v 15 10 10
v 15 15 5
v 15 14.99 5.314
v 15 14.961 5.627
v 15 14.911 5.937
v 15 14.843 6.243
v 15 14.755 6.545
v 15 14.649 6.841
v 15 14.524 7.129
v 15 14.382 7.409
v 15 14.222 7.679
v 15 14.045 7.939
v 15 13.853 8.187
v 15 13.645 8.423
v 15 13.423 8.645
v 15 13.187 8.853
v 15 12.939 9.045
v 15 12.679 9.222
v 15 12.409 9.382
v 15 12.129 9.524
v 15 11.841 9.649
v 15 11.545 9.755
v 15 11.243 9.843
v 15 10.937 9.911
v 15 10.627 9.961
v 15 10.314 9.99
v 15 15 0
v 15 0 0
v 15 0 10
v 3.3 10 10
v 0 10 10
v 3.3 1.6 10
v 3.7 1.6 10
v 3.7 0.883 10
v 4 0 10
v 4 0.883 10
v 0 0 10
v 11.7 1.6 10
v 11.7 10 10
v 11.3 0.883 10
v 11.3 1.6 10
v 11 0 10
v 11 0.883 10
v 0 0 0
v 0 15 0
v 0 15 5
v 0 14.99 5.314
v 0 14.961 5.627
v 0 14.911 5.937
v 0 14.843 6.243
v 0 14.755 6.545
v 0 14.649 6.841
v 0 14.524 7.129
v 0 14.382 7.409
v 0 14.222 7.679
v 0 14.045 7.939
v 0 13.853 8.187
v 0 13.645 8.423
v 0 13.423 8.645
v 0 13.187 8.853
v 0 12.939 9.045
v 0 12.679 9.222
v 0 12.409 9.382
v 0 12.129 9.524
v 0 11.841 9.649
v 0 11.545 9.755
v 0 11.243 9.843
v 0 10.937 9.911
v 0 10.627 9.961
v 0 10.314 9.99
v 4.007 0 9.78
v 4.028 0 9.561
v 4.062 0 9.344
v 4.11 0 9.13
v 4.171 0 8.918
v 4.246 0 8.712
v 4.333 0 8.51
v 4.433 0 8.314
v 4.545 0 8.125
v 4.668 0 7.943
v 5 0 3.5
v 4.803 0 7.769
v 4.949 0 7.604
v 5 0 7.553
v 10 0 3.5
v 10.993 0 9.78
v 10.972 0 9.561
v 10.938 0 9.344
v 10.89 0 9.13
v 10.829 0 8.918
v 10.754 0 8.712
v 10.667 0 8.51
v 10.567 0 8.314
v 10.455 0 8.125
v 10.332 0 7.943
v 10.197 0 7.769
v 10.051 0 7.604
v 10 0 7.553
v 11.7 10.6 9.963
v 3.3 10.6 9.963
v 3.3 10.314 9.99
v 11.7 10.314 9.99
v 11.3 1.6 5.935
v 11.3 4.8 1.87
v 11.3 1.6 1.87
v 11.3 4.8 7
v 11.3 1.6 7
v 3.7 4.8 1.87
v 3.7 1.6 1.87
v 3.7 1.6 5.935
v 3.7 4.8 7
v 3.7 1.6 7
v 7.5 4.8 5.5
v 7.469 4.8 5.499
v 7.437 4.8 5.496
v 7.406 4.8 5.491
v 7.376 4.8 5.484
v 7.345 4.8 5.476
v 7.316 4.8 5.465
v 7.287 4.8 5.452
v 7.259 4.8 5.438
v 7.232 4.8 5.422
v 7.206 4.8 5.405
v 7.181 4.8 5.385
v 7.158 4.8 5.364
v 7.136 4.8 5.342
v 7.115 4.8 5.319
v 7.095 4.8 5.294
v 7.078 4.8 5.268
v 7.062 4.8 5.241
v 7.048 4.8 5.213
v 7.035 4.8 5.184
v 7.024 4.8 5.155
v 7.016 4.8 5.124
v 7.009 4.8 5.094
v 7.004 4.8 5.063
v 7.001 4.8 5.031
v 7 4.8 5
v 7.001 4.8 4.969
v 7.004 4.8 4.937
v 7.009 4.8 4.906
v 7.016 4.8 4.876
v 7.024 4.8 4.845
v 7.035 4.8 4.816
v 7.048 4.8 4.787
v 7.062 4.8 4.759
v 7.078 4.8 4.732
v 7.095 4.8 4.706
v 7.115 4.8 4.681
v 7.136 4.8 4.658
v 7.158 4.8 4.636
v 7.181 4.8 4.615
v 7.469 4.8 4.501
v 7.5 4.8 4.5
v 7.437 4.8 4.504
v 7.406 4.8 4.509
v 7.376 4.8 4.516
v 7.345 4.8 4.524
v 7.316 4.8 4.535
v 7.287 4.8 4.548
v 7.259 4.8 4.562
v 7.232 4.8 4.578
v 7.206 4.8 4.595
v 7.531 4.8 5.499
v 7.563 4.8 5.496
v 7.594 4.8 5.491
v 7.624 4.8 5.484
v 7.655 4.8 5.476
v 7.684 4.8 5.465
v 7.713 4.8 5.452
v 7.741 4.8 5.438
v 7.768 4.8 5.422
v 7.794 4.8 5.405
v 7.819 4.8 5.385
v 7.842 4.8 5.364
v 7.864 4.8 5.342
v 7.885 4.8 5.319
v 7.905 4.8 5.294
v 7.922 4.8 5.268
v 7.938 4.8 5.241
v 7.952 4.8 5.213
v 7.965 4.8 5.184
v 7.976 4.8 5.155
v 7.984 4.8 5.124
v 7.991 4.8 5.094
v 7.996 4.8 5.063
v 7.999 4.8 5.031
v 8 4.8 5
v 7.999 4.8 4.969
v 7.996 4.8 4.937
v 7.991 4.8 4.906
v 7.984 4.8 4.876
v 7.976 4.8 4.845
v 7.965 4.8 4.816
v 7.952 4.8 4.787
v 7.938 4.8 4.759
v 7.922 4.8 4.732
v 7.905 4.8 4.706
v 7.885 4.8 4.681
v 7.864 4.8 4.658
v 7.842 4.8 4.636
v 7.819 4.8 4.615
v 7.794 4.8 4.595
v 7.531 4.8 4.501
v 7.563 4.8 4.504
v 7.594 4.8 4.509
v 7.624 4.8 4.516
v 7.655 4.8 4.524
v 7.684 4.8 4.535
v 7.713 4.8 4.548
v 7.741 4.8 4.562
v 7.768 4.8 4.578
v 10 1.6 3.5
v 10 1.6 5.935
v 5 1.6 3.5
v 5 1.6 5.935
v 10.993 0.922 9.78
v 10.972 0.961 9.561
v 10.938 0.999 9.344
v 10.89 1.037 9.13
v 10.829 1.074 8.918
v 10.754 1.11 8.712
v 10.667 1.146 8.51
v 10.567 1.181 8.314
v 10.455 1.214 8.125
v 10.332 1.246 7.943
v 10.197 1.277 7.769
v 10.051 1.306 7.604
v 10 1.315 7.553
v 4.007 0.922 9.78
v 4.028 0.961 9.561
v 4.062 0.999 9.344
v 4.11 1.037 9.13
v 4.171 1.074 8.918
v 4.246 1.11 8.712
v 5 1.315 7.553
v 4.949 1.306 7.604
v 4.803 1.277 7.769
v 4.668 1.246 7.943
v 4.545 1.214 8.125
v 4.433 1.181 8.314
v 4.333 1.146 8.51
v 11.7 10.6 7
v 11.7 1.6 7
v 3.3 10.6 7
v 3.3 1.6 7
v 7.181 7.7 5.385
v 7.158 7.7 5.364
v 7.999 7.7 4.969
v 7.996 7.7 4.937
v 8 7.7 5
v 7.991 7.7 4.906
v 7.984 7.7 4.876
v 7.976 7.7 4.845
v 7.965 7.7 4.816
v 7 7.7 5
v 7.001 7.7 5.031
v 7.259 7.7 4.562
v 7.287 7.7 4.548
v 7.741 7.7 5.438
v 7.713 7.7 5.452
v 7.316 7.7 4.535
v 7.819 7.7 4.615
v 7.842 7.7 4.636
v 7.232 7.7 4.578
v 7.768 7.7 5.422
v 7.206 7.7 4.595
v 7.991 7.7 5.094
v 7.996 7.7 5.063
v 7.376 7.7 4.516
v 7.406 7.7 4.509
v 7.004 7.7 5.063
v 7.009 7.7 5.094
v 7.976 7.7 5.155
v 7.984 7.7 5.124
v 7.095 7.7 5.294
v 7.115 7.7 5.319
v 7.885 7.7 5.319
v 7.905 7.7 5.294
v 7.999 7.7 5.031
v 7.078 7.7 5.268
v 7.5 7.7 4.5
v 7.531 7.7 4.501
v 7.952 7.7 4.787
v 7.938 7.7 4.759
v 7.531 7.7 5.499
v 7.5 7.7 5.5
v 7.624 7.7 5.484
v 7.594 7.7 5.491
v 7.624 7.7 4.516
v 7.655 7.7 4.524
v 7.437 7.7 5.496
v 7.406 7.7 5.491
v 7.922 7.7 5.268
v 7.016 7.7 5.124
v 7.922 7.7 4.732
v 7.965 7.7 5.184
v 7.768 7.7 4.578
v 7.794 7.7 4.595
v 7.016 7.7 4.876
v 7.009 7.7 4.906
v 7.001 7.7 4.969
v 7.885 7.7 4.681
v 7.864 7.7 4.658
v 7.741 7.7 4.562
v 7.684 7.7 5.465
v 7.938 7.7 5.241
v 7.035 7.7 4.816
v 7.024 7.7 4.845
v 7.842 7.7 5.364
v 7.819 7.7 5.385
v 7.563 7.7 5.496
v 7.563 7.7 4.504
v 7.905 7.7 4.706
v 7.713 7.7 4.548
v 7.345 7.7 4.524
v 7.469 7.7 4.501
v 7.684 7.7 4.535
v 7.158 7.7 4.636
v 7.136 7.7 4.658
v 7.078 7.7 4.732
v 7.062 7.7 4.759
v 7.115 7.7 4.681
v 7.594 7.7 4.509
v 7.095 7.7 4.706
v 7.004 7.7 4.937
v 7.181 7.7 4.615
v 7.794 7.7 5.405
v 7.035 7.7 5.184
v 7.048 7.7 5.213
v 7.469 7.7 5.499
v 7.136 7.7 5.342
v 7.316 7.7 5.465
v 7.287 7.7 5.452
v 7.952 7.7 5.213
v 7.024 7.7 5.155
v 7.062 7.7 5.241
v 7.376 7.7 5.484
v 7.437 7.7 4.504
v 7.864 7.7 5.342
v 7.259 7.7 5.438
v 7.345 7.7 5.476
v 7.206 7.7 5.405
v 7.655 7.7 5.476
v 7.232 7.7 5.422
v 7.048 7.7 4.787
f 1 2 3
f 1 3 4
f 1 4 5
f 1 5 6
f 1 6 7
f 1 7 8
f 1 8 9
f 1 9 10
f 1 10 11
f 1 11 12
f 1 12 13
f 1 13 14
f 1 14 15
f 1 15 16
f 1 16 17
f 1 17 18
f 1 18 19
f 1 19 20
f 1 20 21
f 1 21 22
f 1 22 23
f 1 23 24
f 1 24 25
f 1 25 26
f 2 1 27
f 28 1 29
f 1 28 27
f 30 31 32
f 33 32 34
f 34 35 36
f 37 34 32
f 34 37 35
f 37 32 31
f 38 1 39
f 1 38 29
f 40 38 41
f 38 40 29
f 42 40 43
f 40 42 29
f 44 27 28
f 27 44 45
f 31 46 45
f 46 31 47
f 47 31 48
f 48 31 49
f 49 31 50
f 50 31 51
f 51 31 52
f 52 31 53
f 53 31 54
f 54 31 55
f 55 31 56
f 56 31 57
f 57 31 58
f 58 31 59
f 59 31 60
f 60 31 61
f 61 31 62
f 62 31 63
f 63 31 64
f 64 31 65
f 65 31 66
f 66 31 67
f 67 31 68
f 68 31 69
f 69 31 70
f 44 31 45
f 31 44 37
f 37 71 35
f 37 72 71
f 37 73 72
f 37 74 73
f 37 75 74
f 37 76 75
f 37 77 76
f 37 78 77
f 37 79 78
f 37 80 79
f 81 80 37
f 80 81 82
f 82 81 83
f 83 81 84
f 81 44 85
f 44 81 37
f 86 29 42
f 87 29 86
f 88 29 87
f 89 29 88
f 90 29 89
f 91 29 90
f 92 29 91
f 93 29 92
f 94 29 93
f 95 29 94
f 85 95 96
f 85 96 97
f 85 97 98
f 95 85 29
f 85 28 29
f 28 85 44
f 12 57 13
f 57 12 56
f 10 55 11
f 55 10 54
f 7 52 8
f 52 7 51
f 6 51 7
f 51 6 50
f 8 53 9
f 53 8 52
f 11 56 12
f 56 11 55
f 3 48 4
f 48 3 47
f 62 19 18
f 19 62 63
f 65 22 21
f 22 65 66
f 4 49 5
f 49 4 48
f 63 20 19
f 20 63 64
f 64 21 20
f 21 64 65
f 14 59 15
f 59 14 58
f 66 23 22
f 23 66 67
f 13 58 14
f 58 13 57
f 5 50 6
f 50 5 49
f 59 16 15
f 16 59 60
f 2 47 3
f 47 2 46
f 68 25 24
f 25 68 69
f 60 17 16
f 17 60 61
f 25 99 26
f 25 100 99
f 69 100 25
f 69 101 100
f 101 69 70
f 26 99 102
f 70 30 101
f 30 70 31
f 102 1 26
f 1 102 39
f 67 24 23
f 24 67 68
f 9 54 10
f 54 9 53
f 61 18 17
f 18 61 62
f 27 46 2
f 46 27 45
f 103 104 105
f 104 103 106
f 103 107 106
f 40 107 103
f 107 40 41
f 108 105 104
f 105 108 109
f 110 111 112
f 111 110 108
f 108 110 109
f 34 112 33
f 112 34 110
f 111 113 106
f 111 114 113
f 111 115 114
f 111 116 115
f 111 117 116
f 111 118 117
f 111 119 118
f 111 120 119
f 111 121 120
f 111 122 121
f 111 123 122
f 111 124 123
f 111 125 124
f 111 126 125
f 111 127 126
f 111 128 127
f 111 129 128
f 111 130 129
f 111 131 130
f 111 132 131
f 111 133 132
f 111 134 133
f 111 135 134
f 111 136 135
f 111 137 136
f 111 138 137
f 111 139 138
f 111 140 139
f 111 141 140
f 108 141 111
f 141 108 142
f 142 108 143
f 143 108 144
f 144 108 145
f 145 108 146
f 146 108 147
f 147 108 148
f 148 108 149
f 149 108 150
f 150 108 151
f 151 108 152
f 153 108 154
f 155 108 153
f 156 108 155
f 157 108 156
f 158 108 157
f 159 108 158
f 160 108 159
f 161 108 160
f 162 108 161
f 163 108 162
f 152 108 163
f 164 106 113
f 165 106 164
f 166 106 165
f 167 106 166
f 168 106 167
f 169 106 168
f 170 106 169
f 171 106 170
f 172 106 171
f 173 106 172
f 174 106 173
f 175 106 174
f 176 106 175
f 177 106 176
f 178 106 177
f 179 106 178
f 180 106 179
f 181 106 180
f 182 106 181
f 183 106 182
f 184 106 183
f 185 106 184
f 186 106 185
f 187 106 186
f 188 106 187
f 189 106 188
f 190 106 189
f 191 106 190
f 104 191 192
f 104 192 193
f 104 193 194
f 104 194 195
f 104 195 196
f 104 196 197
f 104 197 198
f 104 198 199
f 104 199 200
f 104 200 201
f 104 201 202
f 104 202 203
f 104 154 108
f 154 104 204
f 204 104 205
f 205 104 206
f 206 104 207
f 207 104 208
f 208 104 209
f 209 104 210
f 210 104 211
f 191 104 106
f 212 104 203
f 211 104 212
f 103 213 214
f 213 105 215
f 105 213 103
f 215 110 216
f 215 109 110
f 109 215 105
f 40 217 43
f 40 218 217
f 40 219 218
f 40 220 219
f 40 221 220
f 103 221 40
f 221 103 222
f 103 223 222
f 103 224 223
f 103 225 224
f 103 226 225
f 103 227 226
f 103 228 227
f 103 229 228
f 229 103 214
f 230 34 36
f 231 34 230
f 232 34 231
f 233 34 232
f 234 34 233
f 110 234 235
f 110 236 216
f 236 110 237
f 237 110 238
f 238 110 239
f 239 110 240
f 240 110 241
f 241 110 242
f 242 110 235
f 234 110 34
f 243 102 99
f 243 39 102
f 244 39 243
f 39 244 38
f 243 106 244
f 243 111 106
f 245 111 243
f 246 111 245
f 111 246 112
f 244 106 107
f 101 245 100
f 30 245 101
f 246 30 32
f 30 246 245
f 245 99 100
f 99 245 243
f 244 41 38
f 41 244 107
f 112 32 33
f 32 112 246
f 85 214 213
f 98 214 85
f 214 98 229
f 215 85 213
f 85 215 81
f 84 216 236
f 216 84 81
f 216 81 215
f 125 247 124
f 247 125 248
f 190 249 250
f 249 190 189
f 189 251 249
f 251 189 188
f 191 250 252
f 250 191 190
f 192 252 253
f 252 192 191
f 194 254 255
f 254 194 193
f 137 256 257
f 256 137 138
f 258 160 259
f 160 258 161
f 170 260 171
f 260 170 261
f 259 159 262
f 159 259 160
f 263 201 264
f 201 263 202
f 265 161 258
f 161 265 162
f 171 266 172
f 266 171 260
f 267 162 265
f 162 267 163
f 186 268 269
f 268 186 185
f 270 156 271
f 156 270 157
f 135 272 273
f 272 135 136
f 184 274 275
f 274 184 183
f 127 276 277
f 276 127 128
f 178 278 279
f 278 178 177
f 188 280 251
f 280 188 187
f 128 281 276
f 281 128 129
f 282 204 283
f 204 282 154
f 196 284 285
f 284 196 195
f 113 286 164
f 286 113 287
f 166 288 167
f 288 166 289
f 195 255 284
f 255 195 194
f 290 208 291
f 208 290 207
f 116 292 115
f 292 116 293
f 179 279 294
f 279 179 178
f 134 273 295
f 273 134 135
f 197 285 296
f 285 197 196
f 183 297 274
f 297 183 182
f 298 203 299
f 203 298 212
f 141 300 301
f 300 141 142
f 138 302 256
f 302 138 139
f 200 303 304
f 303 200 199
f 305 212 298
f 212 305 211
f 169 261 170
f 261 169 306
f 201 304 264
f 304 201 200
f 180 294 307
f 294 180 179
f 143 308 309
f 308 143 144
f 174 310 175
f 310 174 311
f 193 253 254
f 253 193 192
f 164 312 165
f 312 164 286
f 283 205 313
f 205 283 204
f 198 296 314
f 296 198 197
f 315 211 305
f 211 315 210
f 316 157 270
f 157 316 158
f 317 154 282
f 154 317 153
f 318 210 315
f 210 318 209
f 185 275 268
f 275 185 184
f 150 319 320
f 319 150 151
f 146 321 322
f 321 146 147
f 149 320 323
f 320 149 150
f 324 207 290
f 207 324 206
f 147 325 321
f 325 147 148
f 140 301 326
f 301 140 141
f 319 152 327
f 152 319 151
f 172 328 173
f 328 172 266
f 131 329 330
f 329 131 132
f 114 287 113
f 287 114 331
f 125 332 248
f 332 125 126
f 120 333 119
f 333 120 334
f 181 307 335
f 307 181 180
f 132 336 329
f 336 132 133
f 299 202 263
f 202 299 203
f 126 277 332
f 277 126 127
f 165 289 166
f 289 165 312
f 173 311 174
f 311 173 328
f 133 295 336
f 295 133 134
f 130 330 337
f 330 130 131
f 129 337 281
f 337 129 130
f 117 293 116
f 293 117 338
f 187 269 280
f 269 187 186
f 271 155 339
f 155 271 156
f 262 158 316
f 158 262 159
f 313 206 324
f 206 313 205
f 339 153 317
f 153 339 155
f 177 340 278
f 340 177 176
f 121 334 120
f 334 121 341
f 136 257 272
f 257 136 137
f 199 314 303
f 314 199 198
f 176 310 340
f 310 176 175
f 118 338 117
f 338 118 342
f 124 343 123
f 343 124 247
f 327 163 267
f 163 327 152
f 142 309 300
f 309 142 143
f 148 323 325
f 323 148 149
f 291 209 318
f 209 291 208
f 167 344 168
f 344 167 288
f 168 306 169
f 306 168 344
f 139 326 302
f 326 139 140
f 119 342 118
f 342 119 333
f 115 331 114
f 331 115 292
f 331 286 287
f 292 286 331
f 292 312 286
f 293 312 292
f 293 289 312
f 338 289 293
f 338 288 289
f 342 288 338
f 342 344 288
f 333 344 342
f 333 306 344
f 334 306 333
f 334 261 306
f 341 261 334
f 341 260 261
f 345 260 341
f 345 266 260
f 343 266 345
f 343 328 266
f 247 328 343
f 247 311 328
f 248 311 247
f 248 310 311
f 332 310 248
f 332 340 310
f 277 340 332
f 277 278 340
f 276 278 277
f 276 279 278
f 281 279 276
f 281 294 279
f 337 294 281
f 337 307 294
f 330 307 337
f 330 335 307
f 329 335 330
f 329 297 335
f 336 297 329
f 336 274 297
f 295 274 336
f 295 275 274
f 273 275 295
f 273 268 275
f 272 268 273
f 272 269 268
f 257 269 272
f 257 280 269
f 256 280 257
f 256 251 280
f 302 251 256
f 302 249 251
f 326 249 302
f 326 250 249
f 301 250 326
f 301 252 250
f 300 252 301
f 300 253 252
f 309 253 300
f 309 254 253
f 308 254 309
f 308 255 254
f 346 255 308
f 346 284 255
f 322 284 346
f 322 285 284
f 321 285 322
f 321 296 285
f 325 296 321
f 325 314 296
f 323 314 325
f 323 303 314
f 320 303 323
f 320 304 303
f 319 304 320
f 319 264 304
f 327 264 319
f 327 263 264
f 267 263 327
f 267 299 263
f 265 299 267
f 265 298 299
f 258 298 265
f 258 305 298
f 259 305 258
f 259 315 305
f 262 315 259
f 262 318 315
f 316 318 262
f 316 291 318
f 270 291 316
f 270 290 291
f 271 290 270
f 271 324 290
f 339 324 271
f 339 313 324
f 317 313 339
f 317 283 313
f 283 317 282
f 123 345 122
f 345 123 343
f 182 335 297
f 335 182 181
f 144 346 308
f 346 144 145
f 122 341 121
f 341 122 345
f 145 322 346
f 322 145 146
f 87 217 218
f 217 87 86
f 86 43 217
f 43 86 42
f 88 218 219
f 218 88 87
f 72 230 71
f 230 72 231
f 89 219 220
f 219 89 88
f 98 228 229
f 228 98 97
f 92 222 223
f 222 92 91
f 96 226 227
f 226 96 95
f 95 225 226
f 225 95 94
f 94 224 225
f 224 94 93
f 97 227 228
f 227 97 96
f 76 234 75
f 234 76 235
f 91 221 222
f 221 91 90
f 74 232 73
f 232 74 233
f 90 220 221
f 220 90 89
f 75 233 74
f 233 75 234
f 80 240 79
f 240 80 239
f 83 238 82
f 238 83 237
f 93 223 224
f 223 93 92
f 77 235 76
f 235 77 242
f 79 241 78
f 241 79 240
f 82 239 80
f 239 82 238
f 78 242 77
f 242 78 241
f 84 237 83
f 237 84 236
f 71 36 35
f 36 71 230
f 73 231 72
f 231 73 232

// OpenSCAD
OUTER_WIDTH = 15;
OUTER_HEIGHT = 10;
OUTER_LENGTH = 10;

EXT_THICK = 1.6;
EXT_HEIGHT = 3.5;
EXT_WIDTH = 5;
INNER_WIDTH = 7.6;
INNER_LENGTH = 3.2;
INNER_HEIGHT = 8.13;

I2_WIDTH = 8.4;
I2_HEIGHT = 3;
I2_LENGTH = 9;

HOLE_D = 1;
HOLE_DZ = 5;
HOLE_LEN = 3;

EXT_HOLE_D = 7;
TOP_CYL_D = 10;

$fn = 100;

module belt_part() {
    difference() {
        union() {
            cube([OUTER_WIDTH, OUTER_LENGTH, OUTER_HEIGHT]);
            
            translate([0, OUTER_LENGTH, OUTER_HEIGHT - TOP_CYL_D/2])
            rotate(90, [0, 1, 0])
            cylinder(OUTER_WIDTH, d=TOP_CYL_D);    
    
            cube([OUTER_WIDTH, OUTER_LENGTH + TOP_CYL_D/2, TOP_CYL_D/2]);        
        }

        translate([
            (OUTER_WIDTH - INNER_WIDTH)/2,
            EXT_THICK,
            OUTER_HEIGHT - INNER_HEIGHT
        ])
        cube([INNER_WIDTH, INNER_LENGTH, INNER_HEIGHT+0.1]);
        
        // rotated part to make a wedge
        translate([
            (OUTER_WIDTH - INNER_WIDTH)/2,
            EXT_THICK,
            OUTER_HEIGHT - INNER_HEIGHT/2
        ])
        rotate(10, [1, 0, 0])
        cube([INNER_WIDTH, INNER_LENGTH, INNER_HEIGHT/2+0.1]);
                
        translate([
            (OUTER_WIDTH - I2_WIDTH)/2,
            EXT_THICK,
            OUTER_HEIGHT - I2_HEIGHT
        ])
        cube([I2_WIDTH, I2_LENGTH, I2_HEIGHT+0.1]);
        
        translate([
            (OUTER_WIDTH - EXT_WIDTH)/2,
            -0.1,
            EXT_HEIGHT
        ])
        cube([EXT_WIDTH, EXT_THICK+0.2, OUTER_HEIGHT - EXT_HEIGHT + 0.1]);
        
        translate([OUTER_WIDTH/2, EXT_THICK + INNER_LENGTH - 0.1, HOLE_DZ])
        rotate(-90, [1, 0, 0])
        cylinder(HOLE_LEN, d=HOLE_D);  
      
        translate([OUTER_WIDTH/2, -0.1, OUTER_HEIGHT])
        rotate(-90, [1, 0, 0])
        cylinder(EXT_THICK, d=EXT_HOLE_D);  
    }
}

belt_part();
